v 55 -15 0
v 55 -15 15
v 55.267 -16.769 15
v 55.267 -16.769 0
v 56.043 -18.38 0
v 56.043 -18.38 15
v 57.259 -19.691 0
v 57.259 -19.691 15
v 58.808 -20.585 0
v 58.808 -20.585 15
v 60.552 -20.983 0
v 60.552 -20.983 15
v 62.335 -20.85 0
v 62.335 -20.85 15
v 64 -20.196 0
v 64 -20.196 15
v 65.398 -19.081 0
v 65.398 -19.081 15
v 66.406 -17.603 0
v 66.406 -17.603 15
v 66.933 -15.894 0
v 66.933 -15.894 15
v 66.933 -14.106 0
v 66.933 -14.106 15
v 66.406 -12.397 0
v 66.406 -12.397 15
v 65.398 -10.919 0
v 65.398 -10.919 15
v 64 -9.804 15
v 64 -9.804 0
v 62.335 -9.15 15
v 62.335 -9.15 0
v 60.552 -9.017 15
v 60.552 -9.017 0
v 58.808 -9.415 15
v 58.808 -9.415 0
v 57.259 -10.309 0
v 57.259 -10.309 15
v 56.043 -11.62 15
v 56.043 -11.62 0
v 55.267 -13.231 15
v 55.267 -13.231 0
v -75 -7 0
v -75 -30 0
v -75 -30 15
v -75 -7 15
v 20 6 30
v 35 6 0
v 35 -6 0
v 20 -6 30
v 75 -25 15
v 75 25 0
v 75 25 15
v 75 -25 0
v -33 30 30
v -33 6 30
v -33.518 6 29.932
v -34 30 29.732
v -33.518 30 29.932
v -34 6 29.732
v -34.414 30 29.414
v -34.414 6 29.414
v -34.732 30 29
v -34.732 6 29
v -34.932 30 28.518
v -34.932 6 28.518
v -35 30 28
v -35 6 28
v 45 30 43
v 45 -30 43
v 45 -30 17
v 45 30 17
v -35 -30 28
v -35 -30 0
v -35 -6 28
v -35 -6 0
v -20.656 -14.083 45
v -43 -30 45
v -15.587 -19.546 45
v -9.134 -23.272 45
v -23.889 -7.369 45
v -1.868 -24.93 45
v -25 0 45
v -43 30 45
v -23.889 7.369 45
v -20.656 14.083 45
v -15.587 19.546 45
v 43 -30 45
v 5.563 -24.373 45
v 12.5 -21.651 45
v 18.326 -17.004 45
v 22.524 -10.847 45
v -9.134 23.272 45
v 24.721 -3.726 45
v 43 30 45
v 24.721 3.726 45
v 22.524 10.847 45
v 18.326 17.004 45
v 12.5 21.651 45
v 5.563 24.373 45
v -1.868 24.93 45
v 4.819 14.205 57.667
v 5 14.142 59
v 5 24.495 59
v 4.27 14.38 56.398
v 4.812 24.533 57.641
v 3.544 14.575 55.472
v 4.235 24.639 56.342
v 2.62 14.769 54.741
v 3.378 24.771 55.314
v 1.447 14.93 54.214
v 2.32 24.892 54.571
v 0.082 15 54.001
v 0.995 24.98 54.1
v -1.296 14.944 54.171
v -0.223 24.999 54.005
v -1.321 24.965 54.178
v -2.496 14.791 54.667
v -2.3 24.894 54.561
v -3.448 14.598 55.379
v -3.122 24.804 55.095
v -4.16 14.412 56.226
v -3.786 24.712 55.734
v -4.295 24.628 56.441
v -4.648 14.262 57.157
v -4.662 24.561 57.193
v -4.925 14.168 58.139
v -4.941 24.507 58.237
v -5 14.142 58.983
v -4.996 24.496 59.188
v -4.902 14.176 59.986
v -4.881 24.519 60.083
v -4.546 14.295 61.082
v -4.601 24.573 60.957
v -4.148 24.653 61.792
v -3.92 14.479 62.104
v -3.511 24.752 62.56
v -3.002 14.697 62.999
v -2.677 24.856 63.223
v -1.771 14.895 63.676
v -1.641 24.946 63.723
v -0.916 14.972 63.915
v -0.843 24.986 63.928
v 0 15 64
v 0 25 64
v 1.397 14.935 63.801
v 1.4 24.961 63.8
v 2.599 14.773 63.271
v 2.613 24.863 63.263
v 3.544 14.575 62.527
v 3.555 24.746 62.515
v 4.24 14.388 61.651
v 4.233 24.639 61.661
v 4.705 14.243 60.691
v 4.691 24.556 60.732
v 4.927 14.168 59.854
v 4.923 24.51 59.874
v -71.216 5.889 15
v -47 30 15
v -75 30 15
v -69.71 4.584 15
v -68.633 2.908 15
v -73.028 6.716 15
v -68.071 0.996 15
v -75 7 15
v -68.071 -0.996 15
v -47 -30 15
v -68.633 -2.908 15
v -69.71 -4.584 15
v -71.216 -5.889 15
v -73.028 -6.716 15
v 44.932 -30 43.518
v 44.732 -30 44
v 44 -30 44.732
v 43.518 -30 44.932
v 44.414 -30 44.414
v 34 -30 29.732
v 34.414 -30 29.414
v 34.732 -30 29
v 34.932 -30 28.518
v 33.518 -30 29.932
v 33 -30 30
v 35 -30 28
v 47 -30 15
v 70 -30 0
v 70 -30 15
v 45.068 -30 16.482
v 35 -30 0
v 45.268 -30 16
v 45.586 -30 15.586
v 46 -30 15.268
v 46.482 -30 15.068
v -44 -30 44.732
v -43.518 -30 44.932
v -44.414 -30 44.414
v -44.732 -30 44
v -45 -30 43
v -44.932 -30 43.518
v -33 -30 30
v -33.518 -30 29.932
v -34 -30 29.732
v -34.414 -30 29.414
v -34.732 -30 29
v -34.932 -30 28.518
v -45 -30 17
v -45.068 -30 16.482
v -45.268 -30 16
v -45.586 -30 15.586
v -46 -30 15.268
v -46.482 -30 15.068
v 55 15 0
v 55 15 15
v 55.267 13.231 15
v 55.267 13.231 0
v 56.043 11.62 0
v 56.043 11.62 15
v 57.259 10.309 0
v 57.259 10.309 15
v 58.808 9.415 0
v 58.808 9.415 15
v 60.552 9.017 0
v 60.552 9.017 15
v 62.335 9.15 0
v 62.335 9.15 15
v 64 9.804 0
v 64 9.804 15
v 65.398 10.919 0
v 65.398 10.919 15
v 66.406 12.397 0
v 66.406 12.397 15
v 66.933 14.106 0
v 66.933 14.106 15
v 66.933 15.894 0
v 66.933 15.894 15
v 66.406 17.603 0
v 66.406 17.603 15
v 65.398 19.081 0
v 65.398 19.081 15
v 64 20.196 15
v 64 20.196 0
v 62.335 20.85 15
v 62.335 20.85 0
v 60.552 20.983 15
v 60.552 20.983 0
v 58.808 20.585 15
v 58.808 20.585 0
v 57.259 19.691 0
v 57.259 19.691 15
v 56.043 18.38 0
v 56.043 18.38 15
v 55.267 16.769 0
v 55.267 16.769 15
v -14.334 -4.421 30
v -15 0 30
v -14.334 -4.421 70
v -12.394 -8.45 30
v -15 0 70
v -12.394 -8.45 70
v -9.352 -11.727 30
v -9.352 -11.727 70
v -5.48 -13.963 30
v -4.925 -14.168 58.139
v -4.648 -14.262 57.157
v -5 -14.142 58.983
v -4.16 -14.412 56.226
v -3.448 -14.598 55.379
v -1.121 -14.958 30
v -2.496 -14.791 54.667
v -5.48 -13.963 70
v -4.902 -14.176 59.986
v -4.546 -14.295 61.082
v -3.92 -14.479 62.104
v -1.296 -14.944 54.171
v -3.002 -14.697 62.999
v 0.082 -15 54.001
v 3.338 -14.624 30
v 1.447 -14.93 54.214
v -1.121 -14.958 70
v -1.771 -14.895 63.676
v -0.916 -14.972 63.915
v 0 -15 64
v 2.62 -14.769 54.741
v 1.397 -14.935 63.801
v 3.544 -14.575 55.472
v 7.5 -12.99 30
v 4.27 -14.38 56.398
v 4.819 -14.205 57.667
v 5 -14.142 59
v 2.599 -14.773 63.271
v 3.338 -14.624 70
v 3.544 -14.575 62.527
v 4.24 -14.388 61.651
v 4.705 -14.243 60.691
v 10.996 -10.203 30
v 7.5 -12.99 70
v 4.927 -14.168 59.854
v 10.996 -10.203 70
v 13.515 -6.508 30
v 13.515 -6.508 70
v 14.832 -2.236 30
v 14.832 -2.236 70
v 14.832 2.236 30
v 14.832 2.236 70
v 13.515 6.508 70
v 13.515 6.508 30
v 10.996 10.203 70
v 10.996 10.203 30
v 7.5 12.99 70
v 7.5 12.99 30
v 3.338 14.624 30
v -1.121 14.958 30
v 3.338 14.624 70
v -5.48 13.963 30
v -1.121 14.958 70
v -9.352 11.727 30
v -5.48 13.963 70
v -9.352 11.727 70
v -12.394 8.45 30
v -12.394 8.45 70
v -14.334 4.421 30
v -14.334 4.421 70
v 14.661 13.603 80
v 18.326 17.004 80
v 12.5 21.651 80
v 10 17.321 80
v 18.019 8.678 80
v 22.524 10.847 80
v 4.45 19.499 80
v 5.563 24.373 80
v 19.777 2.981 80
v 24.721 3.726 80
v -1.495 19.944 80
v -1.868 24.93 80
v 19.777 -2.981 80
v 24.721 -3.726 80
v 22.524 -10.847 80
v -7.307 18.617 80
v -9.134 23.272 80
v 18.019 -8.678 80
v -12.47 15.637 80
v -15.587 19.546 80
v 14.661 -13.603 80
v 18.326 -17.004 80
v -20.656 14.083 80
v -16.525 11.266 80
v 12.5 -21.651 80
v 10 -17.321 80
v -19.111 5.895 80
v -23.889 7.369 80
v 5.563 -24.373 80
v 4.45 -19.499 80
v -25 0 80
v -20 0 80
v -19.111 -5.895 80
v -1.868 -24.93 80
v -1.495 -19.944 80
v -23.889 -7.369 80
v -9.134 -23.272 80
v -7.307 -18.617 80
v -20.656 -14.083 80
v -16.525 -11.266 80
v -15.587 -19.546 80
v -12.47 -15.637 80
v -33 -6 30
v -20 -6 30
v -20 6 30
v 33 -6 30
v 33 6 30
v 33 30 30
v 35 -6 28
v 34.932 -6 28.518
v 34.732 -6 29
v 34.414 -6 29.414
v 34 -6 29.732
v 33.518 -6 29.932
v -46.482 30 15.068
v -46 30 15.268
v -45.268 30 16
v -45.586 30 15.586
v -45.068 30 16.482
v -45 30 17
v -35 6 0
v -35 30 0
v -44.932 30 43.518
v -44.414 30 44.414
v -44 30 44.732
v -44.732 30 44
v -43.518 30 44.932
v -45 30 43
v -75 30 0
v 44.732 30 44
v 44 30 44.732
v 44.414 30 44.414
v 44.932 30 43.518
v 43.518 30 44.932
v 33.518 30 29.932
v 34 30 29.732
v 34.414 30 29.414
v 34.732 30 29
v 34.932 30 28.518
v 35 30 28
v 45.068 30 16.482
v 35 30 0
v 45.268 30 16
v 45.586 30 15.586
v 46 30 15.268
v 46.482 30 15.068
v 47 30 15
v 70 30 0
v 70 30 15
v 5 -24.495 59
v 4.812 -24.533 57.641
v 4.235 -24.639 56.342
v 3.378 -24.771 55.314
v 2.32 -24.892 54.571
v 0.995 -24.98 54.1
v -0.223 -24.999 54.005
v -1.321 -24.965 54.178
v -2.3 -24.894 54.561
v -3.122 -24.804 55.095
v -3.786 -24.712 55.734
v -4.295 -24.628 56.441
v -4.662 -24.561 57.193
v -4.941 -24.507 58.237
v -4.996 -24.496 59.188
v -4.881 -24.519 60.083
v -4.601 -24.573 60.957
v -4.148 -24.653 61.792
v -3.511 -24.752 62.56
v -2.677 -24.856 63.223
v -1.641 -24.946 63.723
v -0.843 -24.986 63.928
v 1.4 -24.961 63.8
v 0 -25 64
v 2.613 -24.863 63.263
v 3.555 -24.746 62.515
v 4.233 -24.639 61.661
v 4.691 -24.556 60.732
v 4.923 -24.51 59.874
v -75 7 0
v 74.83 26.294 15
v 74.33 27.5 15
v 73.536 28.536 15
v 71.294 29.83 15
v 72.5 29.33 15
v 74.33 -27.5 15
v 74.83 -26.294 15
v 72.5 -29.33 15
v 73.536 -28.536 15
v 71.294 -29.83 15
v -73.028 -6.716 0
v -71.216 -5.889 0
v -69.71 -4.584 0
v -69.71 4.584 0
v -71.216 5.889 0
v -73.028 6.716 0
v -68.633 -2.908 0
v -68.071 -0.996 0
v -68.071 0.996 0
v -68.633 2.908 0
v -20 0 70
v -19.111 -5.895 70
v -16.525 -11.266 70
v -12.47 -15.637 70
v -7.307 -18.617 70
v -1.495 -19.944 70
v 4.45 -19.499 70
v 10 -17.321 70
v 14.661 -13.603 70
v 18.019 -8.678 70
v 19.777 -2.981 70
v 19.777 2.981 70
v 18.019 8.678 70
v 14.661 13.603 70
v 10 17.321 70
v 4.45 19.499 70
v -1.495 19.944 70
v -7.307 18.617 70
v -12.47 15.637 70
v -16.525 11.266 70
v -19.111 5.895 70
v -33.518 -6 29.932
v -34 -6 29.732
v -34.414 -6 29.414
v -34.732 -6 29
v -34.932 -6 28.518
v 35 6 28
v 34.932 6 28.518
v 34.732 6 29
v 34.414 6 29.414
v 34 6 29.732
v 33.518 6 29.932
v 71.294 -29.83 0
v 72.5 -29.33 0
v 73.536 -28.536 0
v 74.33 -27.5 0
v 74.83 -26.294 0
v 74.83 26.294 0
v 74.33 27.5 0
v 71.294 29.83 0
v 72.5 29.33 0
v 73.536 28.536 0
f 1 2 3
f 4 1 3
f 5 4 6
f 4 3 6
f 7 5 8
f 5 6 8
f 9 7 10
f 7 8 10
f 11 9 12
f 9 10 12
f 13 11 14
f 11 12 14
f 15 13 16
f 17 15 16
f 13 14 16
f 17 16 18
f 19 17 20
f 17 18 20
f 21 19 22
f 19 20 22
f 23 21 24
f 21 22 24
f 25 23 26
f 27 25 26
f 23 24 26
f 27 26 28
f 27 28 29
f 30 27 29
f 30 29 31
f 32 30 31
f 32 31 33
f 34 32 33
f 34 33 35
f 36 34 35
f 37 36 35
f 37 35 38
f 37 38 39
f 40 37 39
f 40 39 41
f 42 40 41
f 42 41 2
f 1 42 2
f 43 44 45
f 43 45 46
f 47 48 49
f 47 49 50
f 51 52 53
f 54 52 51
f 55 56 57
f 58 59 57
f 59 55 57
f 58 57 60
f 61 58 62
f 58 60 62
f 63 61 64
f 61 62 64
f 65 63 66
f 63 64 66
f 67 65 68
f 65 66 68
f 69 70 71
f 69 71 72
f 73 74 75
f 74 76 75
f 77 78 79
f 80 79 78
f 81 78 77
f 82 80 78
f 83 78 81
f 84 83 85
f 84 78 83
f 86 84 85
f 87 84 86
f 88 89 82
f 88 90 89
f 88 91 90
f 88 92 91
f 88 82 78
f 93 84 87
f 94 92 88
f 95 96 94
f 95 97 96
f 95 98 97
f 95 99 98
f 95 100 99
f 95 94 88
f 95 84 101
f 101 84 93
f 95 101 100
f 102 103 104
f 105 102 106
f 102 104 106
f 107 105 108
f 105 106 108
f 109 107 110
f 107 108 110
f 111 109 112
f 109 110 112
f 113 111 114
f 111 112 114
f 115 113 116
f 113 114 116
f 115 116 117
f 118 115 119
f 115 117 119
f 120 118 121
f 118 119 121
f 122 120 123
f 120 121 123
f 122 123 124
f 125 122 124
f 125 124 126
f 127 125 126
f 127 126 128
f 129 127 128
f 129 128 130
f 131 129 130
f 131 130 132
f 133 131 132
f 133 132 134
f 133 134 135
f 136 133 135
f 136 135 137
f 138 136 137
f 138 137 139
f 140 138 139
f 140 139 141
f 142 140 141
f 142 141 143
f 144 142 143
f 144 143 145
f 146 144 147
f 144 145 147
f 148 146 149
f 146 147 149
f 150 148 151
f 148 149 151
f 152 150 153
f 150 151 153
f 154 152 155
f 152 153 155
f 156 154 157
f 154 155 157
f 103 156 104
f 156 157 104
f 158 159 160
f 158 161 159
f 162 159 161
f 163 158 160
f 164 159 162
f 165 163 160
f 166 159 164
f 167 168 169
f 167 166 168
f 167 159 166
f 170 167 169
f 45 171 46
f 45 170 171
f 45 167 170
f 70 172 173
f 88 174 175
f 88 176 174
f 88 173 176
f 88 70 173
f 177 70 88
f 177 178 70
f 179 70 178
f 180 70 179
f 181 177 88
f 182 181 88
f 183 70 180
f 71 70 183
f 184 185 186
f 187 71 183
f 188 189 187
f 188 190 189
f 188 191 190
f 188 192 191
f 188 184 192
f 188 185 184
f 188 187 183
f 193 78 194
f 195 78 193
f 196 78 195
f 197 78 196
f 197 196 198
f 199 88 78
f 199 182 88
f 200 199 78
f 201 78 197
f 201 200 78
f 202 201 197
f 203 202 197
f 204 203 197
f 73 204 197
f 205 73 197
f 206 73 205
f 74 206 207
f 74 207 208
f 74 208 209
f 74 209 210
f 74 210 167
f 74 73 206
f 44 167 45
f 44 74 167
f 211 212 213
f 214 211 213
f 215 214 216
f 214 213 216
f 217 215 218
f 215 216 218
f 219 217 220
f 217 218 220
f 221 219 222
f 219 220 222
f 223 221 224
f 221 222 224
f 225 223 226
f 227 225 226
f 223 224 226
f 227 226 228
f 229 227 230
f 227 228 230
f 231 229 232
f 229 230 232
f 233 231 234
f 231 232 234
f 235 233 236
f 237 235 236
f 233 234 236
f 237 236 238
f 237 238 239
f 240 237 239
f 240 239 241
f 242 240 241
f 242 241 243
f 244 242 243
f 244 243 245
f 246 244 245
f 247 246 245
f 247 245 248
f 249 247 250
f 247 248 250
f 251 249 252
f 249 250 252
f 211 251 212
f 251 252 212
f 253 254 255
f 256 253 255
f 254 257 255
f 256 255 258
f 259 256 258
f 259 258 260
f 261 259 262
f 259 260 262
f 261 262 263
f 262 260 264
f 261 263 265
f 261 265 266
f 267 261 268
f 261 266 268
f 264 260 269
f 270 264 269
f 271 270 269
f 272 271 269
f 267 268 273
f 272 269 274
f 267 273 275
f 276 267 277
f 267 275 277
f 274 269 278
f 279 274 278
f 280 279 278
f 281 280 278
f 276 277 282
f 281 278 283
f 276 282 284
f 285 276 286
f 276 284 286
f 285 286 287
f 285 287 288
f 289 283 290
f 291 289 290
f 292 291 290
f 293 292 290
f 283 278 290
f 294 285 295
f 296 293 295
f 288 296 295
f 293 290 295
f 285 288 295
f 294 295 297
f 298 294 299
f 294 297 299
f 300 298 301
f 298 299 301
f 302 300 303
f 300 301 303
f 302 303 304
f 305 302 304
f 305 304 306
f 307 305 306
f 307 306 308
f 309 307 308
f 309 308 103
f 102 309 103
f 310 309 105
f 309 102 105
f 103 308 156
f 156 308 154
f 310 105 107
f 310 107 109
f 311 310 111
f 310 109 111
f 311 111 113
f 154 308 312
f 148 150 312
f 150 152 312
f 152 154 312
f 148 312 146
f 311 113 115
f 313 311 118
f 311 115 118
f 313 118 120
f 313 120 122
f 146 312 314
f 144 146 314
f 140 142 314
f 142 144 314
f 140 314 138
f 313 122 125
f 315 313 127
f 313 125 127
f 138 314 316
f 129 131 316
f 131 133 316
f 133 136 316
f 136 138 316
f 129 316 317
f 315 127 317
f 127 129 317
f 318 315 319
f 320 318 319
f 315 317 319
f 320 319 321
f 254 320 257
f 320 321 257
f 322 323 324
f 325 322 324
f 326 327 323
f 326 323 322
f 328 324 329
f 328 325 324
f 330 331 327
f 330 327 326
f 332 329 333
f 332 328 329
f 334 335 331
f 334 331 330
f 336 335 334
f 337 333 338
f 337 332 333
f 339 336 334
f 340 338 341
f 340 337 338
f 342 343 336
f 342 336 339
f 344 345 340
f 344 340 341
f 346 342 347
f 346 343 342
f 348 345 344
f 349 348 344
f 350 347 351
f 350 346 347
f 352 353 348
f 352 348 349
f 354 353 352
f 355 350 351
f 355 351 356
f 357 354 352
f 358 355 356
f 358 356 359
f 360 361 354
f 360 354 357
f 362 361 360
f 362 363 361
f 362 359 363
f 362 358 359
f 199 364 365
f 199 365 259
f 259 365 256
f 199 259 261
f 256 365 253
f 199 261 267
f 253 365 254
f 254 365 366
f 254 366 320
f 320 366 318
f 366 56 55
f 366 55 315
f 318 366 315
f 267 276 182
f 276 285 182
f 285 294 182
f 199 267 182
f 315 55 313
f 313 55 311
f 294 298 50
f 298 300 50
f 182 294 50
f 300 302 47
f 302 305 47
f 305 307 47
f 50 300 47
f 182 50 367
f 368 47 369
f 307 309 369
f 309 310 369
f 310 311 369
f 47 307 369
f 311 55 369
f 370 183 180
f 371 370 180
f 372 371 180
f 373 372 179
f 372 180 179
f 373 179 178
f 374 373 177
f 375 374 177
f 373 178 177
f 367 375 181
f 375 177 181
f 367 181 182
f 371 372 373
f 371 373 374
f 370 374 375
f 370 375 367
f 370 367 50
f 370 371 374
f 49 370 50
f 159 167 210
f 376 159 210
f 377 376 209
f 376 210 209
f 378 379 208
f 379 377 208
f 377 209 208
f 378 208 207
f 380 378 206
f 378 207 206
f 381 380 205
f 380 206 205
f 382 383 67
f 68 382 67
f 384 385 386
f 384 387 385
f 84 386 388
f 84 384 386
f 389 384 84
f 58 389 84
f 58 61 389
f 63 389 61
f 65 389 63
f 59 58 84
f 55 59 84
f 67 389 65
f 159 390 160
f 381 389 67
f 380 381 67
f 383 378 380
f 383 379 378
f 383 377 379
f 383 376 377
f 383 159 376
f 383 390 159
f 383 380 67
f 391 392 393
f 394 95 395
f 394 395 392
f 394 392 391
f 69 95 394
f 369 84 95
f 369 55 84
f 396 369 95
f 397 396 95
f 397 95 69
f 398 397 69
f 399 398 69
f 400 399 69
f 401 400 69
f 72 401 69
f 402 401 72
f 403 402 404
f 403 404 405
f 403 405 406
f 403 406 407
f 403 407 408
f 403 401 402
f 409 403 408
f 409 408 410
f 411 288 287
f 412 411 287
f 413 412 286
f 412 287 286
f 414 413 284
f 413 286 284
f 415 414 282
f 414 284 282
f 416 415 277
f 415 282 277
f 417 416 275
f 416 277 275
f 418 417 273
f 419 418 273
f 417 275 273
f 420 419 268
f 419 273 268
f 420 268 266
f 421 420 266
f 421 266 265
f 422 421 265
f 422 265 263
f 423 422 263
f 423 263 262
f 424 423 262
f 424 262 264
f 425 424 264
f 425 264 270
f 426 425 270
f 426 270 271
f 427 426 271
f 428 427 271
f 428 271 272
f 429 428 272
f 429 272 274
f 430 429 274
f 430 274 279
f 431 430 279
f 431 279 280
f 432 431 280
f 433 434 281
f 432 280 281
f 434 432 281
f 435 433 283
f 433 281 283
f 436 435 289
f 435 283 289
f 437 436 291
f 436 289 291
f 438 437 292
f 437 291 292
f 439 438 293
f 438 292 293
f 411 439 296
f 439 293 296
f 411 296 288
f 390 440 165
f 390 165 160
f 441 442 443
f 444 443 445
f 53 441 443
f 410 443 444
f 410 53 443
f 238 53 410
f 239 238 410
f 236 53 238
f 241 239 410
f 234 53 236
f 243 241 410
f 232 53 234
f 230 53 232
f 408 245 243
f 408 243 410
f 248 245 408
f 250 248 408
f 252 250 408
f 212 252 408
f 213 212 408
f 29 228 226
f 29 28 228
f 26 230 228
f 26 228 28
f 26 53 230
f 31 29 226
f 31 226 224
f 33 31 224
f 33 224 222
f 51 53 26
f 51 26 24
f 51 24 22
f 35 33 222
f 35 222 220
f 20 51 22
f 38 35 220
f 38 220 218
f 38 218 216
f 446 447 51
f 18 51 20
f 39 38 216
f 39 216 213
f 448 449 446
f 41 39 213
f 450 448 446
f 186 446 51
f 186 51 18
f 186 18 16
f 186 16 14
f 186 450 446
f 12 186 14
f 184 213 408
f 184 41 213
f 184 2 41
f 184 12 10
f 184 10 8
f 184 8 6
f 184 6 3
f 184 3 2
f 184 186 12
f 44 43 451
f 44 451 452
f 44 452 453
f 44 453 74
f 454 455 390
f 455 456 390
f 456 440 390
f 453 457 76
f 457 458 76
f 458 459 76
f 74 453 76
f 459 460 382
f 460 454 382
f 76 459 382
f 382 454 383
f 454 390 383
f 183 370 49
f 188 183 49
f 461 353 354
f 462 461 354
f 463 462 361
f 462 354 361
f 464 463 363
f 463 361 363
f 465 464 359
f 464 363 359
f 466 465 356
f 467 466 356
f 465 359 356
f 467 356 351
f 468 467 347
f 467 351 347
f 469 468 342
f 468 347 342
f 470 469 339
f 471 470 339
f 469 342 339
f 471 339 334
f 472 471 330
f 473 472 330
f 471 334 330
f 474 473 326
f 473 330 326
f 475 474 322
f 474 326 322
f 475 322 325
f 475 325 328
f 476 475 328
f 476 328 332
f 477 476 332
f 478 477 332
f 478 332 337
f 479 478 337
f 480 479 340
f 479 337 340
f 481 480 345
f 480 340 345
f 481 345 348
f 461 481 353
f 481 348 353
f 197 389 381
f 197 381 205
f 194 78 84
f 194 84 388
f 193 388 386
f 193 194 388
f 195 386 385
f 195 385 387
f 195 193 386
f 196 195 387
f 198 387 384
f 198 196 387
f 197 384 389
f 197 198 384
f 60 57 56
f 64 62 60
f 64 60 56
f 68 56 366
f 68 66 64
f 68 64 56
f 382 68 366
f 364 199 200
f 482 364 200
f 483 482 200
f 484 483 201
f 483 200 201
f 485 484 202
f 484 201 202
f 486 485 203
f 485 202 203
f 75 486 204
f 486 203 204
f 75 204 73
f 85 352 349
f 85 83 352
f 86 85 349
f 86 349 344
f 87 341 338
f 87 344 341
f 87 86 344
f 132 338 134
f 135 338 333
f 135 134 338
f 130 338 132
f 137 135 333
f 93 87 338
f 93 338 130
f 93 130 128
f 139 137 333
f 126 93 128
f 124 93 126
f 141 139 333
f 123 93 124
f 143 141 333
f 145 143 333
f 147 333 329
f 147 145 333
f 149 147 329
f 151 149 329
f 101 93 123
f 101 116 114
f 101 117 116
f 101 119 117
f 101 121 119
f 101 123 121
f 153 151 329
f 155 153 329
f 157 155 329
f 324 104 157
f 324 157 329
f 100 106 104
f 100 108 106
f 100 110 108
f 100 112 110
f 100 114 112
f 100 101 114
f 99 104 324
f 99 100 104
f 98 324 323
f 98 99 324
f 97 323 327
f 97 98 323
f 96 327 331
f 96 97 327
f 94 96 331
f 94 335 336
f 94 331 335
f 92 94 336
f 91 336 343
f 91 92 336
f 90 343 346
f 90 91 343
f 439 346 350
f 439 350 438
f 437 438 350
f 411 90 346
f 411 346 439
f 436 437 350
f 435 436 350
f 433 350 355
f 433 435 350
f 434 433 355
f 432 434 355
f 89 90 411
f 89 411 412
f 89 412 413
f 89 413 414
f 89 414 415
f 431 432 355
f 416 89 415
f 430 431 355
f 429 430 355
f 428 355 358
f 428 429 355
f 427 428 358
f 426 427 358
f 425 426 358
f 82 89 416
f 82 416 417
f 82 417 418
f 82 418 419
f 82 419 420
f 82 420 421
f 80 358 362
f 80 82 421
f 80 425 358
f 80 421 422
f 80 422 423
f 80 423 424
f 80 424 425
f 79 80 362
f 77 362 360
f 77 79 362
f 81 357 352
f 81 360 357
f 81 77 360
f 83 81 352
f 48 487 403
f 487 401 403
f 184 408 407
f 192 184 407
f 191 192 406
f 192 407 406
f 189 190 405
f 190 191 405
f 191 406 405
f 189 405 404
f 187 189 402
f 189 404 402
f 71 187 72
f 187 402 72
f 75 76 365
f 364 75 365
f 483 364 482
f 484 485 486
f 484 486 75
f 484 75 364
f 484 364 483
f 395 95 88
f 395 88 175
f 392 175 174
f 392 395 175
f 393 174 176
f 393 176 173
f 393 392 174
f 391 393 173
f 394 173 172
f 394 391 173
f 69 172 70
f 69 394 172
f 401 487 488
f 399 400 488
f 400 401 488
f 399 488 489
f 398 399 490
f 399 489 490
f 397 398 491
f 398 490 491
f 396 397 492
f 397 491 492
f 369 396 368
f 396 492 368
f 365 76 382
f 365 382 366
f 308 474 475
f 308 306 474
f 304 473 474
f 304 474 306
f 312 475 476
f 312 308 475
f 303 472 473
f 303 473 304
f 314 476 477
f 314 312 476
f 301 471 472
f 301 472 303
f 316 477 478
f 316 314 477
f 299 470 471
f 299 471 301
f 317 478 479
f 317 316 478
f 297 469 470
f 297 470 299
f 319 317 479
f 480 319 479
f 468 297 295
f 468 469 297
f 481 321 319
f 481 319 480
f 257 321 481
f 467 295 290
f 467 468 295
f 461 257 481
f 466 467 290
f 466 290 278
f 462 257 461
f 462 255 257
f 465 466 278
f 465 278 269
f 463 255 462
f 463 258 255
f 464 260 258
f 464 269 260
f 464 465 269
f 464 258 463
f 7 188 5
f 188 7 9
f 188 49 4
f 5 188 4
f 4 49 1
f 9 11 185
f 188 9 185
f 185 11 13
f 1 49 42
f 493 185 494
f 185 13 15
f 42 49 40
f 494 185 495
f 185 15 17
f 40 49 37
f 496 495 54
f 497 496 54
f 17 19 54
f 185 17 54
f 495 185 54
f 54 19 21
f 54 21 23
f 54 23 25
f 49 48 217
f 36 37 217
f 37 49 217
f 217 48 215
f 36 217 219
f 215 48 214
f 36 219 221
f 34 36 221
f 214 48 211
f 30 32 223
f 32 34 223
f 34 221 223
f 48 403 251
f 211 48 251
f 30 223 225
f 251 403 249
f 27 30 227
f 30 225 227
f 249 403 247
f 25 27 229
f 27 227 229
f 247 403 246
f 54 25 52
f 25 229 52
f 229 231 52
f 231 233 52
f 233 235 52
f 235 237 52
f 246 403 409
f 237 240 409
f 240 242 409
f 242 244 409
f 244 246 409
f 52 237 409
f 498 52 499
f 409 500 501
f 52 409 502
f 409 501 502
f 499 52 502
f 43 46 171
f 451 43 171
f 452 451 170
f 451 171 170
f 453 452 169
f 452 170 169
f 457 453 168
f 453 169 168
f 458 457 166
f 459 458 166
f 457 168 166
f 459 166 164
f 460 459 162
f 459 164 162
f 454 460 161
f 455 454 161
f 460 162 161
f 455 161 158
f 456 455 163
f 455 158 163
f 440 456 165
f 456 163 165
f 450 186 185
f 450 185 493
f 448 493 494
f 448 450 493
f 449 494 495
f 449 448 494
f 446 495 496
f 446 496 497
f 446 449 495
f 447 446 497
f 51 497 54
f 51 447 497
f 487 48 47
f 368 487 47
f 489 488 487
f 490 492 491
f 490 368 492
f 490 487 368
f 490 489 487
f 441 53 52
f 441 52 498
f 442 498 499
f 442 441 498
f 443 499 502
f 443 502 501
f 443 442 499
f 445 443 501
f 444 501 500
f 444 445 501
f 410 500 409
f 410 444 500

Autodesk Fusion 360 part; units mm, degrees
sketch "Sketch2" plane through (0, 0, 0) normal (0, 0, 1) x (1, 0, 0)
  line L0 (-75, 30) -> (75, 30)
  line L1 (75, 30) -> (75, -30)
  line L2 (75, -30) -> (-75, -30)
  line L3 (-75, -30) -> (-75, 30)
  point P0 (-75, 0)
  point P1 (0, 30)
  point P2 (-75, 30)
  point P3 (0, -30)
  point P4 (-75, -30)
  point P5 (-75, 0)
  point P6 (75, 0)
  point P7 (75, 80)
  point P8 (-75, 80)
  point P9 (75, 30)
  point P10 (-75, 30)
  point P11 (-75, -30)
  point P12 (75, -30)
  point P13 (-45, 30)
  point P14 (-45, -30)
  point P15 (75, -30)
  point P16 (75, 30)
  point P17 (45, 45)
  point P18 (-45, 45)
  point P19 (-45, 15)
  point P20 (-75, 15)
  point P21 (-75, 0)
  point P22 (-35, 0)
  point P23 (-35, 30)
  point P24 (35, 30)
  point P25 (35, 0)
  point P26 (75, 0)
  point P27 (75, 15)
  point P28 (45, 15)
  point P29 (-75, 30)
  point P30 (-75, -30)
  point P31 (75, -30)
  point P32 (75, 30)
  point P33 (30, 28)
  point P34 (-30, 28)
  point P35 (-30, 0)
  point P36 (30, 0)
  point P37 (-35, 31)
  point P38 (-35, 0)
  point P39 (-20, 0)
  point P40 (-20, 31)
  point P41 (30, 28)
  point P42 (-30, 28)
  point P43 (-30, 0)
  point P44 (30, 0)
  dimension "d3" = 150
extrude "Extrude1" add sketch "Sketch2" along normal blind 80 makes body 1
sketch "Sketch3" plane through (0, 30, 0) normal (0, 1, 0) x (-1, 0, 0)
  line L0 (-75, 0) -> (75, 0)
  line L1 (75, 0) -> (75, 80)
  line L2 (75, 80) -> (-75, 80)
  line L3 (-75, 80) -> (-75, 0)
  line L4 (-35, 0) -> (35, 0)
  line L5 (35, 0) -> (35, 30)
  line L6 (35, 30) -> (-35, 30)
  line L7 (-35, 30) -> (-35, 0)
  point P0 (-35, 0)
  point P1 (35, 0)
  dimension "d6" = 30
extrude "Extrude2" cut sketch "Sketch3" against normal blind 95 contours L0 L4 L5 L6 L7 bodies 1
sketch "Sketch4" plane through (0, 0, 80) normal (0, 0, 1) x (-1, 0, 0)
  line L0 (75, 30) -> (-75, 30)
  line L1 (-75, 30) -> (-75, -30)
  line L2 (-75, -30) -> (75, -30)
  line L3 (75, -30) -> (75, 30)
  line L4 (-75, 30) -> (-45, 30)
  line L5 (-45, 30) -> (-45, -30)
  line L6 (-45, -30) -> (-75, -30)
  line L7 (-75, -30) -> (-75, 30)
  dimension "d9" = 30
  dimension "d10" = 60
extrude "Extrude3" cut sketch "Sketch4" against normal blind 65 contours L0 L1 L2 L4 L5 L6 L7 bodies 1
sketch "Sketch5" plane through (0, 0, 80) normal (0, 0, 1) x (-1, 0, 0)
  line L0 (-45, 30) -> (-45, -30)
  line L1 (-45, -30) -> (75, -30)
  line L2 (75, -30) -> (75, 30)
  line L3 (75, 30) -> (-45, 30)
  line L4 (45, 30) -> (75, 30)
  line L5 (75, 30) -> (75, -30)
  line L6 (75, -30) -> (45, -30)
  line L7 (45, -30) -> (45, 30)
extrude "Extrude4" cut sketch "Sketch5" against normal blind 65 contours L1 L2 L3 L4 L5 L6 L7 bodies 1
extrude "Extrude5" cut 1 faces at (-15, 10, 80) along direction (0, 0, -1) blind 35 on bodies 1 bodies 1
sketch "Sketch6" plane through (0, 30, 0) normal (0, 1, 0) x (-1, 0, 0)
  line L0 (45, 45) -> (-45, 45)
  line L1 (-45, 45) -> (-45, 15)
  line L2 (-45, 15) -> (-75, 15)
  line L3 (-75, 15) -> (-75, 0)
  line L4 (-75, 0) -> (-35, 0)
  line L5 (-35, 0) -> (-35, 30)
  line L6 (-35, 30) -> (35, 30)
  line L7 (35, 30) -> (35, 0)
  line L8 (35, 0) -> (75, 0)
  line L9 (75, 0) -> (75, 15)
  line L10 (75, 15) -> (45, 15)
  line L11 (45, 15) -> (45, 45)
sketch "Sketch7" plane through (0, 30, 0) normal (0, 1, 0) x (-1, 0, 0)
fillet "Fillet1" radius 2 1 edges at (-45, 0, 45) on bodies 1
fillet "Fillet2" radius 2 1 edges at (45, 0, 45) on bodies 1
fillet "Fillet3" radius 2 1 edges at (45, 0, 15) on bodies 1
fillet "Fillet4" radius 2 1 edges at (-45, 0, 15) on bodies 1
sketch "Sketch8" plane through (0, 0, 15) normal (0, 0, 1) x (-1, 0, 0)
  line L0 (-47, -30) -> (-47, 30)
  line L1 (-47, 30) -> (-75, 30)
  line L2 (-75, 30) -> (-75, -30)
  line L3 (-75, -30) -> (-47, -30)
  line L4 (-61, 30) -> (-61, -30)
  line L5 (-75, 0) -> (-47, 0)
  circle A0 centre (-61, 15) radius 6
  circle A1 centre (-61, -15) radius 6
  dimension "d25" = 12
  dimension "d26" = 12
extrude "Extrude6" cut sketch "Sketch8" against normal blind 14 contours L4 A1 | L4 A1 bodies 1
extrude "Extrude7" cut 1 faces at (59.4674, 14.5272, 1) along direction (0, 0, -1) blind 16 on bodies 1 bodies 1
extrude "Extrude8" cut sketch "Sketch8" against normal blind 21 contours L4 A0 | L4 A0 bodies 1
sketch "Sketch9" plane through (0, 0, 15) normal (0, 0, 1) x (-1, 0, 0)
  line L0 (47, 30) -> (47, -30)
  line L1 (47, -30) -> (75, -30)
  line L2 (75, -30) -> (75, 30)
  line L3 (75, 30) -> (47, 30)
  circle A0 centre (75, 0) radius 7
  dimension "d33" = 14
extrude "Extrude9" cut sketch "Sketch9" against normal blind 34 contours L2 A0 picked at (72.7252, 0.5192) bodies 1
sketch "Sketch10" plane through (0, 0, 15) normal (0, 0, 1) x (-1, 0, 0)
  circle A0 centre (-70, 25) radius 5
  circle A1 centre (-70, -25) radius 5
  arc A2 (-75, -25) -> (-70, -30) centre (-72.5, -27.5) ccw
  arc A3 (-70, 30) -> (-75, 25) centre (-72.5, 27.5) ccw
  point P0 (-72.5, 30)
  point P1 (-75, 27.5)
  point P2 (-75, 30)
  point P3 (-70, 30)
  point P4 (-75, 25)
  point P5 (-70, -30)
  point P6 (-75, -25)
  dimension "d37" = 10
  dimension "d38" = 10
extrude "Extrude10" cut sketch "Sketch10" against normal blind 17 contours A0 A3 bodies 1
extrude "Extrude11" cut sketch "Sketch10" against normal blind 23 contours A1 A2 bodies 1
sketch "Sketch11" plane through (0, 0, 45) normal (0, 0, 1) x (-1, 0, 0)
  line L0 (-43, 30) -> (-43, -30)
  line L1 (-43, -30) -> (43, -30)
  line L2 (43, -30) -> (43, 30)
  line L3 (43, 30) -> (-43, 30)
sketch "Sketch12" plane through (0, 0, 45) normal (0, 0, 1) x (-1, 0, 0)
sketch "Sketch13" plane through (0, 0, 45) normal (0, 0, 1) x (-1, 0, 0)
  circle A0 centre (0, 0) radius 25
  point P0 (0, 30)
  point P1 (75, 30)
  point P2 (0, -30)
  point P3 (-45, 0)
  point P4 (47, 0)
  dimension "d43" = 50
extrude "Extrude12" add sketch "Sketch13" along normal blind 35 bodies 1
sketch "Sketch14" plane through (0, 0, 80) normal (0, 0, 1) x (-1, 0, 0)
  circle A0 centre (0, 0) radius 25
  circle A1 centre (0, 0) radius 20
  dimension "d46" = 40
extrude "Extrude13" cut sketch "Sketch14" against normal blind 10 contours A1 bodies 1
sketch "Sketch15" plane through (0, 0, 70) normal (0, 0, 1) x (-1, 0, 0)
  circle A0 centre (0, 0) radius 20
  circle A1 centre (0, 0) radius 15
  dimension "d49" = 30
extrude "Extrude14" cut sketch "Sketch15" against normal blind 25 contours A1 bodies 1
sketch "Sketch16" plane through (0, 0, 0) normal (0, 1, 0) x (1, 0, 0)
  line L0 (0, -80) -> (0, -59)
  circle A0 centre (0, -59) radius 5
  point P0 (0, -80)
  dimension "d52" = 21
  dimension "d53" = 10
extrude "Extrude15" cut sketch "Sketch16" along normal blind -40 and the other way blind -40 bodies 1
fillet "Fillet5" radius 2 1 edges at (-35, 0, 30) on bodies 1
fillet "Fillet6" radius 2 1 edges at (35, 0, 30) on bodies 1
sketch "Sketch17" plane through (-35, 0, 0) normal (1, 0, 0) x (0, 1, 0)
  line L0 (30, 28) -> (-30, 28)
  line L1 (-30, 28) -> (-30, 0)
  line L2 (-30, 0) -> (30, 0)
  line L3 (30, 0) -> (30, 28)
  line L4 (-6, 0) -> (6, 0)
  line L5 (-6, 0) -> (-6, 31)
  line L6 (-6, 31) -> (6, 31)
  line L7 (6, 31) -> (6, 0)
extrude "Extrude16" add sketch "Sketch17" along normal blind 15 separate body contours L0 L2 L4 L5 L7 | L0 L5 L6 L7 makes body 2
sketch "Sketch18" plane through (0, -6, 0) normal (0, -1, 0) x (1, 0, 0)
  line L0 (-35, 31) -> (-35, 0)
  line L1 (-35, 0) -> (-20, 0)
  line L2 (-20, 0) -> (-20, 31)
  line L3 (-20, 31) -> (-35, 31)
  line L4 (-35, 0) -> (-20, 30)
  line L5 (-35, 0) -> (-20, 0)
  line L6 (-20, 0) -> (-20, 30)
extrude "Extrude17" cut sketch "Sketch18" against normal blind 54 contours L1 L2 L4 L5 L6 bodies 2
sketch "Sketch19" plane through (35, 0, 0) normal (-1, 0, 0) x (0, -1, 0)
  line L0 (30, 28) -> (-30, 28)
  line L1 (-30, 28) -> (-30, 0)
  line L2 (-30, 0) -> (30, 0)
  line L3 (30, 0) -> (30, 28)
copy_body "CopyPasteBodies1" bodies 2 makes body 3
move_body "Move1" bodies 3 to x (-1, 0, 0) y (0, -1, 0) z (0, 0, 1) at (-27, -12, 0)
move_body "Move2" bodies 3 to x (1, 0, 0) y (0, 1, 0) z (0, 0, 1) at (27, 12, 0)
sketch "Sketch20" plane through (0, 0, 0) normal (0, 1, 0) x (1, 0, 0)
extrude "Extrude18" cut sketch "Sketch15" against normal blind 45 contours A1 bodies 1
combine "Combine1" operation add target body 1 tool bodies 2 3
